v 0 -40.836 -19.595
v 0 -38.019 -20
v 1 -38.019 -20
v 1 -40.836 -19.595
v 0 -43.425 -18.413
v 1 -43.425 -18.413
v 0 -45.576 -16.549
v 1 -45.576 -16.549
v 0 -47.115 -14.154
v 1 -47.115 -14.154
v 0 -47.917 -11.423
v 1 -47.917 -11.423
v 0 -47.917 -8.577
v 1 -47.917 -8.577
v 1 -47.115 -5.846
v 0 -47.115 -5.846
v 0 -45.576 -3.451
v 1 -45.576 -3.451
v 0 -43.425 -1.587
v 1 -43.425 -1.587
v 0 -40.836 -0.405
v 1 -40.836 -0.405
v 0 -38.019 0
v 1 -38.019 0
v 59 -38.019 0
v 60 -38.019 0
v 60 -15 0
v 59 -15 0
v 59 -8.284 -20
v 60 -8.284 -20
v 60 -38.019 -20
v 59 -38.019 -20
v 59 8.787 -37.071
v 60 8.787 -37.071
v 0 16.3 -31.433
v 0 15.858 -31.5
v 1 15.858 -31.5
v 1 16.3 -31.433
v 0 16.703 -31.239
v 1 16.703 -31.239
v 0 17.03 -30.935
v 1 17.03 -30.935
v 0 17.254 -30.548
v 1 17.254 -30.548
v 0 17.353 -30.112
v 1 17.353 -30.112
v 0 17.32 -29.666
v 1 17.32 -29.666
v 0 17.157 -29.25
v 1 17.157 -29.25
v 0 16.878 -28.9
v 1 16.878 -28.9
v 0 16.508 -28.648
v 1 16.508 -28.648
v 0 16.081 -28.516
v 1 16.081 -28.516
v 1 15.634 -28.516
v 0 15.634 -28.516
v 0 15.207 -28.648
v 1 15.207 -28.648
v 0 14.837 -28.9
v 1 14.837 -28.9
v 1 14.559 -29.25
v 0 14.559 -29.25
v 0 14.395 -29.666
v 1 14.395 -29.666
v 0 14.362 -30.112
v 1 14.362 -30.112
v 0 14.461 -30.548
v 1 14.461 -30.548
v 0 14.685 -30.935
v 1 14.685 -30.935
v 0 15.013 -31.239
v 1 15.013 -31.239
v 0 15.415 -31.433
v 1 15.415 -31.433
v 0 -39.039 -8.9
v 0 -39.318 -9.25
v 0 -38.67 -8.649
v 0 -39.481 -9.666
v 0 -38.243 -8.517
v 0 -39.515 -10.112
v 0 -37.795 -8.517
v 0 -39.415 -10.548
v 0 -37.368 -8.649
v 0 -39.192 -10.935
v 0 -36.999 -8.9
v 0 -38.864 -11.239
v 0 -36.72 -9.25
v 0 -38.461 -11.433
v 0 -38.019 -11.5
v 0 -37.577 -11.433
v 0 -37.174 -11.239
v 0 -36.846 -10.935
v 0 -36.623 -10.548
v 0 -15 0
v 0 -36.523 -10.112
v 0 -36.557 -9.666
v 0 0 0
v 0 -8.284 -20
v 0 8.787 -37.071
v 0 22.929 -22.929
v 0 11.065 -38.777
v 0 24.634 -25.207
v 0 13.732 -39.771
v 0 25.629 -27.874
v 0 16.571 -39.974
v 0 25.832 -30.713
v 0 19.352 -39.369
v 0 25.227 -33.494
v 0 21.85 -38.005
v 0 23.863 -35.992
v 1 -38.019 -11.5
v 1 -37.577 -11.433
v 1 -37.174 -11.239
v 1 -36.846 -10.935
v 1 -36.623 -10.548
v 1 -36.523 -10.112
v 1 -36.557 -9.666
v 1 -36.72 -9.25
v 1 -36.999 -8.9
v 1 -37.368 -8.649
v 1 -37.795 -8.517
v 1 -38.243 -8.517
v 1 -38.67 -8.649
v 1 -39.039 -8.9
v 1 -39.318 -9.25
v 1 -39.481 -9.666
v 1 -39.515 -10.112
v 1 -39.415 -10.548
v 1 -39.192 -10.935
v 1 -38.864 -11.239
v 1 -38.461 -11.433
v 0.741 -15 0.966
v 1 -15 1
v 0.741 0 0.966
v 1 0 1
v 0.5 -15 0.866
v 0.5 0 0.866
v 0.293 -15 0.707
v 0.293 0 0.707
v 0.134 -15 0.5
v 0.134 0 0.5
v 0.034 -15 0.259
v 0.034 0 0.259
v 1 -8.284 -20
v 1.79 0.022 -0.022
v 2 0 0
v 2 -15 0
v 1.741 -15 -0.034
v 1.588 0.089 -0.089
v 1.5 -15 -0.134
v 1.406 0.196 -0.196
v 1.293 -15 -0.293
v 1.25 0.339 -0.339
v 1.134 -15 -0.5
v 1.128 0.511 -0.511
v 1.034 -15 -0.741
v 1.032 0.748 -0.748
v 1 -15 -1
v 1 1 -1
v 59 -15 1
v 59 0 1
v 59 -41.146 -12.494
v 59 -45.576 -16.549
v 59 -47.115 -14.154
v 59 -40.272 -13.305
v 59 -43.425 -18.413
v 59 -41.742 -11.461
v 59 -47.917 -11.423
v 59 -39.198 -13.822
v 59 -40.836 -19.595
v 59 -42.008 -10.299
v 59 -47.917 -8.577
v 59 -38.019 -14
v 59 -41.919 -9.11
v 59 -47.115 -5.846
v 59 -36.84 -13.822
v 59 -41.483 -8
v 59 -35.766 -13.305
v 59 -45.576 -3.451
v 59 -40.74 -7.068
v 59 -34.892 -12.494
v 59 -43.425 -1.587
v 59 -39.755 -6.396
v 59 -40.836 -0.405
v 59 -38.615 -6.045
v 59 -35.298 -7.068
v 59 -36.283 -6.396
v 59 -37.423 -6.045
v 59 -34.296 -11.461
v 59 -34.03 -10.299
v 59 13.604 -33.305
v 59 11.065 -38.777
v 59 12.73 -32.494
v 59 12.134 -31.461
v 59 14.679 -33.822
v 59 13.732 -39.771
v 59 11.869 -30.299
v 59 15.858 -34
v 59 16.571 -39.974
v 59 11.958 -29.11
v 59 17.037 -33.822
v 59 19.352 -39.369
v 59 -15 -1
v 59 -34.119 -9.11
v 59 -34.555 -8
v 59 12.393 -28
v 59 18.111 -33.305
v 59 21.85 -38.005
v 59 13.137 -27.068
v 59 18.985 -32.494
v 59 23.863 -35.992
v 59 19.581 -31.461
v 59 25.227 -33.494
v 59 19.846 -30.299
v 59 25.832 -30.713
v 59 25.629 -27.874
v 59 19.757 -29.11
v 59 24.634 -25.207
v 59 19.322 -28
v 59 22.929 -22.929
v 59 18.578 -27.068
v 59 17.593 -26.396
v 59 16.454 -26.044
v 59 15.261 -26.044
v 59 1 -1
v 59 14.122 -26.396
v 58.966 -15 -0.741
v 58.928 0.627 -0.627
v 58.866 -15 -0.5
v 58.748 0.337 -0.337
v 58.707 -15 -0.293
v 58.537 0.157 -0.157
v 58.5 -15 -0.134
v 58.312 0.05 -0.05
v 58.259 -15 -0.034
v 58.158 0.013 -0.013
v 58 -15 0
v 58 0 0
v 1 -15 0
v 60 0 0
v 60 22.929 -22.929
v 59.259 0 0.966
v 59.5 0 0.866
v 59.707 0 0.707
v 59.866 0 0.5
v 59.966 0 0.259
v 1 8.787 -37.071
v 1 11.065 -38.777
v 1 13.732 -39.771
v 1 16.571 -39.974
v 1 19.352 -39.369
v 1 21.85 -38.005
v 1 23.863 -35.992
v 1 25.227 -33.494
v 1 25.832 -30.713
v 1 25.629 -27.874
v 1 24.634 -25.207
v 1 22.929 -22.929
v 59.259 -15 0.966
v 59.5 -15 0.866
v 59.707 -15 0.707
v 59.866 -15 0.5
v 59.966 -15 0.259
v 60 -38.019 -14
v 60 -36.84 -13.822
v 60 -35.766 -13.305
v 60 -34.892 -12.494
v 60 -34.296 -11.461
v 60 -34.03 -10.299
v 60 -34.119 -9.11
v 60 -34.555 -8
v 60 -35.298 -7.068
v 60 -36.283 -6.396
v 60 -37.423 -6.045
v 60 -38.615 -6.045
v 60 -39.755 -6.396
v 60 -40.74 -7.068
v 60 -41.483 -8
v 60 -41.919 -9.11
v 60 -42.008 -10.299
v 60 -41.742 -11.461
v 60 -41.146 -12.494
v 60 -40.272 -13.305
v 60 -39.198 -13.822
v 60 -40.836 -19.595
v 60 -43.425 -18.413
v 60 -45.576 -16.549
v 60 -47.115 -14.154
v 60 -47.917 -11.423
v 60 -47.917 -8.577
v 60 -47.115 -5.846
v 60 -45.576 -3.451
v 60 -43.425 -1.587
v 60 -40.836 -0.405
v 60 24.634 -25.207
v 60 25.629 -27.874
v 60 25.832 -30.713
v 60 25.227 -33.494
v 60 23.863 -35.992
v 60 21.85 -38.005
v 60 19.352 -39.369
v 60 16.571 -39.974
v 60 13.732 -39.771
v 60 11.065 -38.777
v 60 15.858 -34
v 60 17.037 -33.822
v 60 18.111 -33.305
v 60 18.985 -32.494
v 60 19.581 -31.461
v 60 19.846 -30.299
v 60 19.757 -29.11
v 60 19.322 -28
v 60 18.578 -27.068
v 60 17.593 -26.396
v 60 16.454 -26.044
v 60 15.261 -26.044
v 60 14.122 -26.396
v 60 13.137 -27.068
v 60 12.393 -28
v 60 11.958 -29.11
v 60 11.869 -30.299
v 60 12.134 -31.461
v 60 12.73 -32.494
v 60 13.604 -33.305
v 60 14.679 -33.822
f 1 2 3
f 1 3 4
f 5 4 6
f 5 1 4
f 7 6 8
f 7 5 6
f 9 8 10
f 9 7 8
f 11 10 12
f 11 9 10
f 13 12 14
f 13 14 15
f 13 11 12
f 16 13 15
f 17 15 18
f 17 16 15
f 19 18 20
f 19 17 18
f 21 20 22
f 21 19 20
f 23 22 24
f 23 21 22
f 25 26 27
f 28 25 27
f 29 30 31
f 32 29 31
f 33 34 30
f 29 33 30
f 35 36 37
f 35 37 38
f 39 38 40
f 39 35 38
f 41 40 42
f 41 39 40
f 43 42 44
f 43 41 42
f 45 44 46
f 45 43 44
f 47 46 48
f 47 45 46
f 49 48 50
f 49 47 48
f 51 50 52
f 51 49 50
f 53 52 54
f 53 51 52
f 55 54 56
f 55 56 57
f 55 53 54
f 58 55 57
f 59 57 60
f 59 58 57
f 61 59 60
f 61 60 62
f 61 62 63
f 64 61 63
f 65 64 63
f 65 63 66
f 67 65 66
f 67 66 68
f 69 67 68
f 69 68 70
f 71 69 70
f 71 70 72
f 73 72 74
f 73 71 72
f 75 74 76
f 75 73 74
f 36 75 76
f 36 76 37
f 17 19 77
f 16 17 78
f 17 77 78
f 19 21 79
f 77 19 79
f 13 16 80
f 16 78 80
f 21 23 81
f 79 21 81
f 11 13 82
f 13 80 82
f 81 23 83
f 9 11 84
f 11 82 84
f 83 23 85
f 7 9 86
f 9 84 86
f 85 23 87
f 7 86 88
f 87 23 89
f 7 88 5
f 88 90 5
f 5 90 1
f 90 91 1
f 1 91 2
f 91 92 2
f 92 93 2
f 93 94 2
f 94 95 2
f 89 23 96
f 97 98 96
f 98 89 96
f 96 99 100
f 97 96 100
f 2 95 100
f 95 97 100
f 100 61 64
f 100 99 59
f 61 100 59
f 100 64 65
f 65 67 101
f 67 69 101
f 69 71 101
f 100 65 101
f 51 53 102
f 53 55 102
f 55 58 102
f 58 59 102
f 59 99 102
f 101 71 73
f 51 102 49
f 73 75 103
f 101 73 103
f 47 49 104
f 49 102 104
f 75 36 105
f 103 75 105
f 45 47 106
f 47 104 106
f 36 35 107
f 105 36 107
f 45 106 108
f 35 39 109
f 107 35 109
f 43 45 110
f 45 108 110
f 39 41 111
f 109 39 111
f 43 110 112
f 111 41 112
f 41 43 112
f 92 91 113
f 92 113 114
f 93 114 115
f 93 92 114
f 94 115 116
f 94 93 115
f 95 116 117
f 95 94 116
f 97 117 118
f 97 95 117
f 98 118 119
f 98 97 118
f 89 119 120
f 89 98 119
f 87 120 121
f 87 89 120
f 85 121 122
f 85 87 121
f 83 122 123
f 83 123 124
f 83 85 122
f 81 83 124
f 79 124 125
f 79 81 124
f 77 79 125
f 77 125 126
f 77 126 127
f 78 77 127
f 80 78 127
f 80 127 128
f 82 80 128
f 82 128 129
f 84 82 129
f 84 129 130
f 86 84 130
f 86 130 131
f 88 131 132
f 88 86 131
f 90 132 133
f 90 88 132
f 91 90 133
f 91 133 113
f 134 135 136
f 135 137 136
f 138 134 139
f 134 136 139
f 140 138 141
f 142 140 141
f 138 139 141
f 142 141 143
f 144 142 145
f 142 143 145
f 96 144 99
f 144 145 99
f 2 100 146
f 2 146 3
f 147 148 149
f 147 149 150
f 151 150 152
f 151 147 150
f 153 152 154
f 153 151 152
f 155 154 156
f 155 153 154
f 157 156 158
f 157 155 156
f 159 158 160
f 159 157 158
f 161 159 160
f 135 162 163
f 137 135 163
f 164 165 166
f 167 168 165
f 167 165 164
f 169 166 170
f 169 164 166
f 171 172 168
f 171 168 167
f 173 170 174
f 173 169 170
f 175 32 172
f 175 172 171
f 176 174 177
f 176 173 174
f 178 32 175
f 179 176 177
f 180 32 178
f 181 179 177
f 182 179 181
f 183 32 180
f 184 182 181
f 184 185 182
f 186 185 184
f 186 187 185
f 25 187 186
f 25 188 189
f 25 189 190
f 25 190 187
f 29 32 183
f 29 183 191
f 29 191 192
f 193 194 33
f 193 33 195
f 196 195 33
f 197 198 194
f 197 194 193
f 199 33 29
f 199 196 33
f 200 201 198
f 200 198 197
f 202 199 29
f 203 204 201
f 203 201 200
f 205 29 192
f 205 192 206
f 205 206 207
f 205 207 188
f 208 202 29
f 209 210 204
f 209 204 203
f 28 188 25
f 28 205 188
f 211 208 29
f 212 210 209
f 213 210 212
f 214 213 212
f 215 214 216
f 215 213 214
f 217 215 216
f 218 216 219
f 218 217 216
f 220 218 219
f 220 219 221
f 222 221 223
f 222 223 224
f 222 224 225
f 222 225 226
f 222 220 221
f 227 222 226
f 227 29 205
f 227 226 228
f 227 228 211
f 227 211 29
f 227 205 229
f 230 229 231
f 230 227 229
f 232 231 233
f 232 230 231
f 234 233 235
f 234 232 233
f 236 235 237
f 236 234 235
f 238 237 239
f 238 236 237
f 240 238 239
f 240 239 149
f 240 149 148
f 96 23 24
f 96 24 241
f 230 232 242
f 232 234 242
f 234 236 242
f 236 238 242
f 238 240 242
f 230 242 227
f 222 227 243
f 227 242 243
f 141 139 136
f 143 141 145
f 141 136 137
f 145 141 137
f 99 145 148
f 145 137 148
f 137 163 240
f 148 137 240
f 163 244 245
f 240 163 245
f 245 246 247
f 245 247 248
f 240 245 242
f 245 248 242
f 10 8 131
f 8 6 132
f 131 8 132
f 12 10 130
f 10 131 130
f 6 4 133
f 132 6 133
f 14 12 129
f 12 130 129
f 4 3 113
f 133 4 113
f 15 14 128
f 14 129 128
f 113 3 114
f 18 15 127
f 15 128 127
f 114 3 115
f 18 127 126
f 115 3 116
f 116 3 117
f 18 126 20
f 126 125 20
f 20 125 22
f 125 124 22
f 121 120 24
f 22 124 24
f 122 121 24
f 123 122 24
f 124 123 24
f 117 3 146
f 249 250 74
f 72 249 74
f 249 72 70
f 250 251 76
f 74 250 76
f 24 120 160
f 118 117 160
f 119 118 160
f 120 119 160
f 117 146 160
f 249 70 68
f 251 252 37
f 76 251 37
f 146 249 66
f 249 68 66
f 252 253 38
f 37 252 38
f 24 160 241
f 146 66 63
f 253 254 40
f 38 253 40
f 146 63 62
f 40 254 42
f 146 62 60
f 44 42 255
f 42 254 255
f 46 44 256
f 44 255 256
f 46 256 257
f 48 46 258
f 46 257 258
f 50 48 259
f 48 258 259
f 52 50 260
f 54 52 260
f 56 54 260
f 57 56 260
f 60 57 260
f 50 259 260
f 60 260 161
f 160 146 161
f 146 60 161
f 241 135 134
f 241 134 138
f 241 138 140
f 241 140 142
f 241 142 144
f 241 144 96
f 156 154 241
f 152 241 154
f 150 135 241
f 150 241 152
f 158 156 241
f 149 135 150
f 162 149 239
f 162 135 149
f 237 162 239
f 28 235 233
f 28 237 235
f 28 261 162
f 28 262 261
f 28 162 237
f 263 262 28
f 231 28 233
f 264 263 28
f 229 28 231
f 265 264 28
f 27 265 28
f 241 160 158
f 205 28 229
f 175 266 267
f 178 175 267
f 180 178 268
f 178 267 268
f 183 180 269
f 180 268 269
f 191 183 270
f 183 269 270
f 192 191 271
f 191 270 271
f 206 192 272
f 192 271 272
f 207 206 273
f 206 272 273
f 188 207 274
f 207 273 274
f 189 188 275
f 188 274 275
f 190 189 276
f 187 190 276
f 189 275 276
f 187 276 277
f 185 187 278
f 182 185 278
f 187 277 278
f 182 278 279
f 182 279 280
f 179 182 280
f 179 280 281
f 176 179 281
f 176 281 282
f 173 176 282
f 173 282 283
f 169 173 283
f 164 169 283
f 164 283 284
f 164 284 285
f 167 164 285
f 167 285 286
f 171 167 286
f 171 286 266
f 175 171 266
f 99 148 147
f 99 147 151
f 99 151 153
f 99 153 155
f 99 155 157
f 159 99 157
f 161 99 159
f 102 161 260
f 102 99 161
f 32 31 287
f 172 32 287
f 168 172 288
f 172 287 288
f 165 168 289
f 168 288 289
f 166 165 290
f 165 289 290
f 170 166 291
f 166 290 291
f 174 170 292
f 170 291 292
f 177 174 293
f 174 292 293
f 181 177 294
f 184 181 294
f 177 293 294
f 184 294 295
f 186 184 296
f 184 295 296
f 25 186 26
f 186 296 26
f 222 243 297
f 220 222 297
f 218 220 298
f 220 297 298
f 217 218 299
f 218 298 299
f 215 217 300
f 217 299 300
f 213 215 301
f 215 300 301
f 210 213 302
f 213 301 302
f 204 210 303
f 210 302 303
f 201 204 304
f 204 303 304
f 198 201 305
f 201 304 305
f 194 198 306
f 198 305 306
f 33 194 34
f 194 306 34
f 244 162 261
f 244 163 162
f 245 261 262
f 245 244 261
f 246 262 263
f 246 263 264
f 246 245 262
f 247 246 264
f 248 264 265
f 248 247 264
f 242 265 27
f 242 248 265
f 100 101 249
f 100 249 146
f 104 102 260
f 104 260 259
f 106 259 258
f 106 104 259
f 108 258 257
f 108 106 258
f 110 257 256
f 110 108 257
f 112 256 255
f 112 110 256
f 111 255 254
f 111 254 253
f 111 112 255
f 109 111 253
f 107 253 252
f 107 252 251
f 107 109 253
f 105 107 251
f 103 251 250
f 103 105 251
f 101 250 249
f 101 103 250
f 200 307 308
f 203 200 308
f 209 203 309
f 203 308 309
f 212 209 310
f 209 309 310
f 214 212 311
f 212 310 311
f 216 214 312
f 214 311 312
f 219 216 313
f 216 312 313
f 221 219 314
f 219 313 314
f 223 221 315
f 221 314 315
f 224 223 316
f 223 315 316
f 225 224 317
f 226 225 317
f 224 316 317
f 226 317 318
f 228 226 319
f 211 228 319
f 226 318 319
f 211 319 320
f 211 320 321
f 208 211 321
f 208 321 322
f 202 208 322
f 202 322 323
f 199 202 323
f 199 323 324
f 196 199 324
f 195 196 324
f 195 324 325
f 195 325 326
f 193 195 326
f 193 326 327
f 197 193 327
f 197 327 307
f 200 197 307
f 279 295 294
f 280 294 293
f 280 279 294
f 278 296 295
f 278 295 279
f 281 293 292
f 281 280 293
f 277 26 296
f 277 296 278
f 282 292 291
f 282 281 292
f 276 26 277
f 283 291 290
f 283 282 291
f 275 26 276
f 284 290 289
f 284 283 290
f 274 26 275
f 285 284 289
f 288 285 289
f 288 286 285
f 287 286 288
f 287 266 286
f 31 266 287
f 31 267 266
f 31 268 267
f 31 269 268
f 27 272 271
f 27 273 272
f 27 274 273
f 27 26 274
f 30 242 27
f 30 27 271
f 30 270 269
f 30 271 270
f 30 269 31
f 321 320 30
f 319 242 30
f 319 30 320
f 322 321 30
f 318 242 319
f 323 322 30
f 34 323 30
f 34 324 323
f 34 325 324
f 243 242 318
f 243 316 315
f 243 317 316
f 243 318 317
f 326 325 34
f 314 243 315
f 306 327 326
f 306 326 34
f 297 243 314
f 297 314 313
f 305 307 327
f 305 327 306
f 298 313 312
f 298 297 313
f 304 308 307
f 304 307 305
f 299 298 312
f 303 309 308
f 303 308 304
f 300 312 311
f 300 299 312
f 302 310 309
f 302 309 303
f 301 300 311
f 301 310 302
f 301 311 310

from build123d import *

# Parameters (mm, degrees)
SKETCH1_R           = 1.5
BOSS_EXTRUDE1_DEPTH = 1
BOSS_EXTRUDE2_START = -1
SKETCH2_W           = 1
SKETCH2_H           = 15
BOSS_EXTRUDE2_DEPTH = 30
FILLET1_R           = 1
CUT_EXTRUDE1_REACH  = 62
SKETCH3_R           = 4


with BuildPart() as part:
    # Sketch1 → Boss-Extrude1 (new body)
    with BuildSketch(Plane(origin=(0, 0, 0), x_dir=(0, 0, -1), z_dir=(1, 0, 0))):
        with BuildLine():
            Line((0, 0), (22.928644487, 22.928644487))
            ThreePointArc((22.928644487, 22.928644487), (37.07078011, 22.928644487), (37.07078011, 8.786508863))
            Line((37.07078011, 8.786508863), (20, -8.284271247))
            Line((20, -8.284271247), (20, -38.019))
            ThreePointArc((20, -38.019), (10, -48.019), (0, -38.019))
            Line((0, -38.019), (0, 0))
        make_face()
        with Locations((29.999712299, 15.857576675)):
            Circle(SKETCH1_R, mode=Mode.SUBTRACT)
        with Locations((10, -38.019)):
            Circle(SKETCH1_R, mode=Mode.SUBTRACT)
    boss_extrude1 = extrude(amount=BOSS_EXTRUDE1_DEPTH)

    # Sketch2 → Boss-Extrude2 (add)
    with BuildSketch(Plane(origin=(1, 0, 0), x_dir=(0, 0, -1), z_dir=(1, 0, 0)).offset(BOSS_EXTRUDE2_START)):
        with Locations((-0.5, -7.5)):
            Rectangle(SKETCH2_W, SKETCH2_H)
    boss_extrude2 = extrude(amount=BOSS_EXTRUDE2_DEPTH)

    # Mirror2: Boss-Extrude1, Boss-Extrude2 across plane
    add(boss_extrude1.mirror(Plane.ZY.offset(-30)))
    add(boss_extrude2.mirror(Plane.ZY.offset(-30)))

    # Fillet1
    fillet1_edges = [part.edges().sort_by_distance(p)[0] for p in [
        (1, -7.5, 0),
        (59, -7.5, 0),
        (0, -7.5, 1),
        (60, -7.5, 1),
    ]]
    fillet(fillet1_edges, radius=FILLET1_R)

    # Sketch3 → Cut-Extrude1 (cut, up to next)
    with BuildSketch(Plane(origin=(60, 0, 0), x_dir=(0, 0, -1), z_dir=(1, 0, 0)), mode=Mode.PRIVATE) as cut_extrude1_sk1:
        with Locations((29.999712299, 15.857576675)):
            Circle(SKETCH3_R)
    cut_extrude1_tool1 = extrude(cut_extrude1_sk1.sketch, amount=-CUT_EXTRUDE1_REACH, mode=Mode.PRIVATE) & part.part
    add(cut_extrude1_tool1.solids().sort_by_distance((60, 15.857577, -29.999712))[0], mode=Mode.SUBTRACT)
    # Sketch3 → Cut-Extrude1 (cut, up to next)
    with BuildSketch(Plane(origin=(60, 0, 0), x_dir=(0, 0, -1), z_dir=(1, 0, 0)), mode=Mode.PRIVATE) as cut_extrude1_sk2:
        with Locations((10, -38.019)):
            Circle(SKETCH3_R)
    cut_extrude1_tool2 = extrude(cut_extrude1_sk2.sketch, amount=-CUT_EXTRUDE1_REACH, mode=Mode.PRIVATE) & part.part
    add(cut_extrude1_tool2.solids().sort_by_distance((60, -38.019, -10))[0], mode=Mode.SUBTRACT)


solid = part.part
